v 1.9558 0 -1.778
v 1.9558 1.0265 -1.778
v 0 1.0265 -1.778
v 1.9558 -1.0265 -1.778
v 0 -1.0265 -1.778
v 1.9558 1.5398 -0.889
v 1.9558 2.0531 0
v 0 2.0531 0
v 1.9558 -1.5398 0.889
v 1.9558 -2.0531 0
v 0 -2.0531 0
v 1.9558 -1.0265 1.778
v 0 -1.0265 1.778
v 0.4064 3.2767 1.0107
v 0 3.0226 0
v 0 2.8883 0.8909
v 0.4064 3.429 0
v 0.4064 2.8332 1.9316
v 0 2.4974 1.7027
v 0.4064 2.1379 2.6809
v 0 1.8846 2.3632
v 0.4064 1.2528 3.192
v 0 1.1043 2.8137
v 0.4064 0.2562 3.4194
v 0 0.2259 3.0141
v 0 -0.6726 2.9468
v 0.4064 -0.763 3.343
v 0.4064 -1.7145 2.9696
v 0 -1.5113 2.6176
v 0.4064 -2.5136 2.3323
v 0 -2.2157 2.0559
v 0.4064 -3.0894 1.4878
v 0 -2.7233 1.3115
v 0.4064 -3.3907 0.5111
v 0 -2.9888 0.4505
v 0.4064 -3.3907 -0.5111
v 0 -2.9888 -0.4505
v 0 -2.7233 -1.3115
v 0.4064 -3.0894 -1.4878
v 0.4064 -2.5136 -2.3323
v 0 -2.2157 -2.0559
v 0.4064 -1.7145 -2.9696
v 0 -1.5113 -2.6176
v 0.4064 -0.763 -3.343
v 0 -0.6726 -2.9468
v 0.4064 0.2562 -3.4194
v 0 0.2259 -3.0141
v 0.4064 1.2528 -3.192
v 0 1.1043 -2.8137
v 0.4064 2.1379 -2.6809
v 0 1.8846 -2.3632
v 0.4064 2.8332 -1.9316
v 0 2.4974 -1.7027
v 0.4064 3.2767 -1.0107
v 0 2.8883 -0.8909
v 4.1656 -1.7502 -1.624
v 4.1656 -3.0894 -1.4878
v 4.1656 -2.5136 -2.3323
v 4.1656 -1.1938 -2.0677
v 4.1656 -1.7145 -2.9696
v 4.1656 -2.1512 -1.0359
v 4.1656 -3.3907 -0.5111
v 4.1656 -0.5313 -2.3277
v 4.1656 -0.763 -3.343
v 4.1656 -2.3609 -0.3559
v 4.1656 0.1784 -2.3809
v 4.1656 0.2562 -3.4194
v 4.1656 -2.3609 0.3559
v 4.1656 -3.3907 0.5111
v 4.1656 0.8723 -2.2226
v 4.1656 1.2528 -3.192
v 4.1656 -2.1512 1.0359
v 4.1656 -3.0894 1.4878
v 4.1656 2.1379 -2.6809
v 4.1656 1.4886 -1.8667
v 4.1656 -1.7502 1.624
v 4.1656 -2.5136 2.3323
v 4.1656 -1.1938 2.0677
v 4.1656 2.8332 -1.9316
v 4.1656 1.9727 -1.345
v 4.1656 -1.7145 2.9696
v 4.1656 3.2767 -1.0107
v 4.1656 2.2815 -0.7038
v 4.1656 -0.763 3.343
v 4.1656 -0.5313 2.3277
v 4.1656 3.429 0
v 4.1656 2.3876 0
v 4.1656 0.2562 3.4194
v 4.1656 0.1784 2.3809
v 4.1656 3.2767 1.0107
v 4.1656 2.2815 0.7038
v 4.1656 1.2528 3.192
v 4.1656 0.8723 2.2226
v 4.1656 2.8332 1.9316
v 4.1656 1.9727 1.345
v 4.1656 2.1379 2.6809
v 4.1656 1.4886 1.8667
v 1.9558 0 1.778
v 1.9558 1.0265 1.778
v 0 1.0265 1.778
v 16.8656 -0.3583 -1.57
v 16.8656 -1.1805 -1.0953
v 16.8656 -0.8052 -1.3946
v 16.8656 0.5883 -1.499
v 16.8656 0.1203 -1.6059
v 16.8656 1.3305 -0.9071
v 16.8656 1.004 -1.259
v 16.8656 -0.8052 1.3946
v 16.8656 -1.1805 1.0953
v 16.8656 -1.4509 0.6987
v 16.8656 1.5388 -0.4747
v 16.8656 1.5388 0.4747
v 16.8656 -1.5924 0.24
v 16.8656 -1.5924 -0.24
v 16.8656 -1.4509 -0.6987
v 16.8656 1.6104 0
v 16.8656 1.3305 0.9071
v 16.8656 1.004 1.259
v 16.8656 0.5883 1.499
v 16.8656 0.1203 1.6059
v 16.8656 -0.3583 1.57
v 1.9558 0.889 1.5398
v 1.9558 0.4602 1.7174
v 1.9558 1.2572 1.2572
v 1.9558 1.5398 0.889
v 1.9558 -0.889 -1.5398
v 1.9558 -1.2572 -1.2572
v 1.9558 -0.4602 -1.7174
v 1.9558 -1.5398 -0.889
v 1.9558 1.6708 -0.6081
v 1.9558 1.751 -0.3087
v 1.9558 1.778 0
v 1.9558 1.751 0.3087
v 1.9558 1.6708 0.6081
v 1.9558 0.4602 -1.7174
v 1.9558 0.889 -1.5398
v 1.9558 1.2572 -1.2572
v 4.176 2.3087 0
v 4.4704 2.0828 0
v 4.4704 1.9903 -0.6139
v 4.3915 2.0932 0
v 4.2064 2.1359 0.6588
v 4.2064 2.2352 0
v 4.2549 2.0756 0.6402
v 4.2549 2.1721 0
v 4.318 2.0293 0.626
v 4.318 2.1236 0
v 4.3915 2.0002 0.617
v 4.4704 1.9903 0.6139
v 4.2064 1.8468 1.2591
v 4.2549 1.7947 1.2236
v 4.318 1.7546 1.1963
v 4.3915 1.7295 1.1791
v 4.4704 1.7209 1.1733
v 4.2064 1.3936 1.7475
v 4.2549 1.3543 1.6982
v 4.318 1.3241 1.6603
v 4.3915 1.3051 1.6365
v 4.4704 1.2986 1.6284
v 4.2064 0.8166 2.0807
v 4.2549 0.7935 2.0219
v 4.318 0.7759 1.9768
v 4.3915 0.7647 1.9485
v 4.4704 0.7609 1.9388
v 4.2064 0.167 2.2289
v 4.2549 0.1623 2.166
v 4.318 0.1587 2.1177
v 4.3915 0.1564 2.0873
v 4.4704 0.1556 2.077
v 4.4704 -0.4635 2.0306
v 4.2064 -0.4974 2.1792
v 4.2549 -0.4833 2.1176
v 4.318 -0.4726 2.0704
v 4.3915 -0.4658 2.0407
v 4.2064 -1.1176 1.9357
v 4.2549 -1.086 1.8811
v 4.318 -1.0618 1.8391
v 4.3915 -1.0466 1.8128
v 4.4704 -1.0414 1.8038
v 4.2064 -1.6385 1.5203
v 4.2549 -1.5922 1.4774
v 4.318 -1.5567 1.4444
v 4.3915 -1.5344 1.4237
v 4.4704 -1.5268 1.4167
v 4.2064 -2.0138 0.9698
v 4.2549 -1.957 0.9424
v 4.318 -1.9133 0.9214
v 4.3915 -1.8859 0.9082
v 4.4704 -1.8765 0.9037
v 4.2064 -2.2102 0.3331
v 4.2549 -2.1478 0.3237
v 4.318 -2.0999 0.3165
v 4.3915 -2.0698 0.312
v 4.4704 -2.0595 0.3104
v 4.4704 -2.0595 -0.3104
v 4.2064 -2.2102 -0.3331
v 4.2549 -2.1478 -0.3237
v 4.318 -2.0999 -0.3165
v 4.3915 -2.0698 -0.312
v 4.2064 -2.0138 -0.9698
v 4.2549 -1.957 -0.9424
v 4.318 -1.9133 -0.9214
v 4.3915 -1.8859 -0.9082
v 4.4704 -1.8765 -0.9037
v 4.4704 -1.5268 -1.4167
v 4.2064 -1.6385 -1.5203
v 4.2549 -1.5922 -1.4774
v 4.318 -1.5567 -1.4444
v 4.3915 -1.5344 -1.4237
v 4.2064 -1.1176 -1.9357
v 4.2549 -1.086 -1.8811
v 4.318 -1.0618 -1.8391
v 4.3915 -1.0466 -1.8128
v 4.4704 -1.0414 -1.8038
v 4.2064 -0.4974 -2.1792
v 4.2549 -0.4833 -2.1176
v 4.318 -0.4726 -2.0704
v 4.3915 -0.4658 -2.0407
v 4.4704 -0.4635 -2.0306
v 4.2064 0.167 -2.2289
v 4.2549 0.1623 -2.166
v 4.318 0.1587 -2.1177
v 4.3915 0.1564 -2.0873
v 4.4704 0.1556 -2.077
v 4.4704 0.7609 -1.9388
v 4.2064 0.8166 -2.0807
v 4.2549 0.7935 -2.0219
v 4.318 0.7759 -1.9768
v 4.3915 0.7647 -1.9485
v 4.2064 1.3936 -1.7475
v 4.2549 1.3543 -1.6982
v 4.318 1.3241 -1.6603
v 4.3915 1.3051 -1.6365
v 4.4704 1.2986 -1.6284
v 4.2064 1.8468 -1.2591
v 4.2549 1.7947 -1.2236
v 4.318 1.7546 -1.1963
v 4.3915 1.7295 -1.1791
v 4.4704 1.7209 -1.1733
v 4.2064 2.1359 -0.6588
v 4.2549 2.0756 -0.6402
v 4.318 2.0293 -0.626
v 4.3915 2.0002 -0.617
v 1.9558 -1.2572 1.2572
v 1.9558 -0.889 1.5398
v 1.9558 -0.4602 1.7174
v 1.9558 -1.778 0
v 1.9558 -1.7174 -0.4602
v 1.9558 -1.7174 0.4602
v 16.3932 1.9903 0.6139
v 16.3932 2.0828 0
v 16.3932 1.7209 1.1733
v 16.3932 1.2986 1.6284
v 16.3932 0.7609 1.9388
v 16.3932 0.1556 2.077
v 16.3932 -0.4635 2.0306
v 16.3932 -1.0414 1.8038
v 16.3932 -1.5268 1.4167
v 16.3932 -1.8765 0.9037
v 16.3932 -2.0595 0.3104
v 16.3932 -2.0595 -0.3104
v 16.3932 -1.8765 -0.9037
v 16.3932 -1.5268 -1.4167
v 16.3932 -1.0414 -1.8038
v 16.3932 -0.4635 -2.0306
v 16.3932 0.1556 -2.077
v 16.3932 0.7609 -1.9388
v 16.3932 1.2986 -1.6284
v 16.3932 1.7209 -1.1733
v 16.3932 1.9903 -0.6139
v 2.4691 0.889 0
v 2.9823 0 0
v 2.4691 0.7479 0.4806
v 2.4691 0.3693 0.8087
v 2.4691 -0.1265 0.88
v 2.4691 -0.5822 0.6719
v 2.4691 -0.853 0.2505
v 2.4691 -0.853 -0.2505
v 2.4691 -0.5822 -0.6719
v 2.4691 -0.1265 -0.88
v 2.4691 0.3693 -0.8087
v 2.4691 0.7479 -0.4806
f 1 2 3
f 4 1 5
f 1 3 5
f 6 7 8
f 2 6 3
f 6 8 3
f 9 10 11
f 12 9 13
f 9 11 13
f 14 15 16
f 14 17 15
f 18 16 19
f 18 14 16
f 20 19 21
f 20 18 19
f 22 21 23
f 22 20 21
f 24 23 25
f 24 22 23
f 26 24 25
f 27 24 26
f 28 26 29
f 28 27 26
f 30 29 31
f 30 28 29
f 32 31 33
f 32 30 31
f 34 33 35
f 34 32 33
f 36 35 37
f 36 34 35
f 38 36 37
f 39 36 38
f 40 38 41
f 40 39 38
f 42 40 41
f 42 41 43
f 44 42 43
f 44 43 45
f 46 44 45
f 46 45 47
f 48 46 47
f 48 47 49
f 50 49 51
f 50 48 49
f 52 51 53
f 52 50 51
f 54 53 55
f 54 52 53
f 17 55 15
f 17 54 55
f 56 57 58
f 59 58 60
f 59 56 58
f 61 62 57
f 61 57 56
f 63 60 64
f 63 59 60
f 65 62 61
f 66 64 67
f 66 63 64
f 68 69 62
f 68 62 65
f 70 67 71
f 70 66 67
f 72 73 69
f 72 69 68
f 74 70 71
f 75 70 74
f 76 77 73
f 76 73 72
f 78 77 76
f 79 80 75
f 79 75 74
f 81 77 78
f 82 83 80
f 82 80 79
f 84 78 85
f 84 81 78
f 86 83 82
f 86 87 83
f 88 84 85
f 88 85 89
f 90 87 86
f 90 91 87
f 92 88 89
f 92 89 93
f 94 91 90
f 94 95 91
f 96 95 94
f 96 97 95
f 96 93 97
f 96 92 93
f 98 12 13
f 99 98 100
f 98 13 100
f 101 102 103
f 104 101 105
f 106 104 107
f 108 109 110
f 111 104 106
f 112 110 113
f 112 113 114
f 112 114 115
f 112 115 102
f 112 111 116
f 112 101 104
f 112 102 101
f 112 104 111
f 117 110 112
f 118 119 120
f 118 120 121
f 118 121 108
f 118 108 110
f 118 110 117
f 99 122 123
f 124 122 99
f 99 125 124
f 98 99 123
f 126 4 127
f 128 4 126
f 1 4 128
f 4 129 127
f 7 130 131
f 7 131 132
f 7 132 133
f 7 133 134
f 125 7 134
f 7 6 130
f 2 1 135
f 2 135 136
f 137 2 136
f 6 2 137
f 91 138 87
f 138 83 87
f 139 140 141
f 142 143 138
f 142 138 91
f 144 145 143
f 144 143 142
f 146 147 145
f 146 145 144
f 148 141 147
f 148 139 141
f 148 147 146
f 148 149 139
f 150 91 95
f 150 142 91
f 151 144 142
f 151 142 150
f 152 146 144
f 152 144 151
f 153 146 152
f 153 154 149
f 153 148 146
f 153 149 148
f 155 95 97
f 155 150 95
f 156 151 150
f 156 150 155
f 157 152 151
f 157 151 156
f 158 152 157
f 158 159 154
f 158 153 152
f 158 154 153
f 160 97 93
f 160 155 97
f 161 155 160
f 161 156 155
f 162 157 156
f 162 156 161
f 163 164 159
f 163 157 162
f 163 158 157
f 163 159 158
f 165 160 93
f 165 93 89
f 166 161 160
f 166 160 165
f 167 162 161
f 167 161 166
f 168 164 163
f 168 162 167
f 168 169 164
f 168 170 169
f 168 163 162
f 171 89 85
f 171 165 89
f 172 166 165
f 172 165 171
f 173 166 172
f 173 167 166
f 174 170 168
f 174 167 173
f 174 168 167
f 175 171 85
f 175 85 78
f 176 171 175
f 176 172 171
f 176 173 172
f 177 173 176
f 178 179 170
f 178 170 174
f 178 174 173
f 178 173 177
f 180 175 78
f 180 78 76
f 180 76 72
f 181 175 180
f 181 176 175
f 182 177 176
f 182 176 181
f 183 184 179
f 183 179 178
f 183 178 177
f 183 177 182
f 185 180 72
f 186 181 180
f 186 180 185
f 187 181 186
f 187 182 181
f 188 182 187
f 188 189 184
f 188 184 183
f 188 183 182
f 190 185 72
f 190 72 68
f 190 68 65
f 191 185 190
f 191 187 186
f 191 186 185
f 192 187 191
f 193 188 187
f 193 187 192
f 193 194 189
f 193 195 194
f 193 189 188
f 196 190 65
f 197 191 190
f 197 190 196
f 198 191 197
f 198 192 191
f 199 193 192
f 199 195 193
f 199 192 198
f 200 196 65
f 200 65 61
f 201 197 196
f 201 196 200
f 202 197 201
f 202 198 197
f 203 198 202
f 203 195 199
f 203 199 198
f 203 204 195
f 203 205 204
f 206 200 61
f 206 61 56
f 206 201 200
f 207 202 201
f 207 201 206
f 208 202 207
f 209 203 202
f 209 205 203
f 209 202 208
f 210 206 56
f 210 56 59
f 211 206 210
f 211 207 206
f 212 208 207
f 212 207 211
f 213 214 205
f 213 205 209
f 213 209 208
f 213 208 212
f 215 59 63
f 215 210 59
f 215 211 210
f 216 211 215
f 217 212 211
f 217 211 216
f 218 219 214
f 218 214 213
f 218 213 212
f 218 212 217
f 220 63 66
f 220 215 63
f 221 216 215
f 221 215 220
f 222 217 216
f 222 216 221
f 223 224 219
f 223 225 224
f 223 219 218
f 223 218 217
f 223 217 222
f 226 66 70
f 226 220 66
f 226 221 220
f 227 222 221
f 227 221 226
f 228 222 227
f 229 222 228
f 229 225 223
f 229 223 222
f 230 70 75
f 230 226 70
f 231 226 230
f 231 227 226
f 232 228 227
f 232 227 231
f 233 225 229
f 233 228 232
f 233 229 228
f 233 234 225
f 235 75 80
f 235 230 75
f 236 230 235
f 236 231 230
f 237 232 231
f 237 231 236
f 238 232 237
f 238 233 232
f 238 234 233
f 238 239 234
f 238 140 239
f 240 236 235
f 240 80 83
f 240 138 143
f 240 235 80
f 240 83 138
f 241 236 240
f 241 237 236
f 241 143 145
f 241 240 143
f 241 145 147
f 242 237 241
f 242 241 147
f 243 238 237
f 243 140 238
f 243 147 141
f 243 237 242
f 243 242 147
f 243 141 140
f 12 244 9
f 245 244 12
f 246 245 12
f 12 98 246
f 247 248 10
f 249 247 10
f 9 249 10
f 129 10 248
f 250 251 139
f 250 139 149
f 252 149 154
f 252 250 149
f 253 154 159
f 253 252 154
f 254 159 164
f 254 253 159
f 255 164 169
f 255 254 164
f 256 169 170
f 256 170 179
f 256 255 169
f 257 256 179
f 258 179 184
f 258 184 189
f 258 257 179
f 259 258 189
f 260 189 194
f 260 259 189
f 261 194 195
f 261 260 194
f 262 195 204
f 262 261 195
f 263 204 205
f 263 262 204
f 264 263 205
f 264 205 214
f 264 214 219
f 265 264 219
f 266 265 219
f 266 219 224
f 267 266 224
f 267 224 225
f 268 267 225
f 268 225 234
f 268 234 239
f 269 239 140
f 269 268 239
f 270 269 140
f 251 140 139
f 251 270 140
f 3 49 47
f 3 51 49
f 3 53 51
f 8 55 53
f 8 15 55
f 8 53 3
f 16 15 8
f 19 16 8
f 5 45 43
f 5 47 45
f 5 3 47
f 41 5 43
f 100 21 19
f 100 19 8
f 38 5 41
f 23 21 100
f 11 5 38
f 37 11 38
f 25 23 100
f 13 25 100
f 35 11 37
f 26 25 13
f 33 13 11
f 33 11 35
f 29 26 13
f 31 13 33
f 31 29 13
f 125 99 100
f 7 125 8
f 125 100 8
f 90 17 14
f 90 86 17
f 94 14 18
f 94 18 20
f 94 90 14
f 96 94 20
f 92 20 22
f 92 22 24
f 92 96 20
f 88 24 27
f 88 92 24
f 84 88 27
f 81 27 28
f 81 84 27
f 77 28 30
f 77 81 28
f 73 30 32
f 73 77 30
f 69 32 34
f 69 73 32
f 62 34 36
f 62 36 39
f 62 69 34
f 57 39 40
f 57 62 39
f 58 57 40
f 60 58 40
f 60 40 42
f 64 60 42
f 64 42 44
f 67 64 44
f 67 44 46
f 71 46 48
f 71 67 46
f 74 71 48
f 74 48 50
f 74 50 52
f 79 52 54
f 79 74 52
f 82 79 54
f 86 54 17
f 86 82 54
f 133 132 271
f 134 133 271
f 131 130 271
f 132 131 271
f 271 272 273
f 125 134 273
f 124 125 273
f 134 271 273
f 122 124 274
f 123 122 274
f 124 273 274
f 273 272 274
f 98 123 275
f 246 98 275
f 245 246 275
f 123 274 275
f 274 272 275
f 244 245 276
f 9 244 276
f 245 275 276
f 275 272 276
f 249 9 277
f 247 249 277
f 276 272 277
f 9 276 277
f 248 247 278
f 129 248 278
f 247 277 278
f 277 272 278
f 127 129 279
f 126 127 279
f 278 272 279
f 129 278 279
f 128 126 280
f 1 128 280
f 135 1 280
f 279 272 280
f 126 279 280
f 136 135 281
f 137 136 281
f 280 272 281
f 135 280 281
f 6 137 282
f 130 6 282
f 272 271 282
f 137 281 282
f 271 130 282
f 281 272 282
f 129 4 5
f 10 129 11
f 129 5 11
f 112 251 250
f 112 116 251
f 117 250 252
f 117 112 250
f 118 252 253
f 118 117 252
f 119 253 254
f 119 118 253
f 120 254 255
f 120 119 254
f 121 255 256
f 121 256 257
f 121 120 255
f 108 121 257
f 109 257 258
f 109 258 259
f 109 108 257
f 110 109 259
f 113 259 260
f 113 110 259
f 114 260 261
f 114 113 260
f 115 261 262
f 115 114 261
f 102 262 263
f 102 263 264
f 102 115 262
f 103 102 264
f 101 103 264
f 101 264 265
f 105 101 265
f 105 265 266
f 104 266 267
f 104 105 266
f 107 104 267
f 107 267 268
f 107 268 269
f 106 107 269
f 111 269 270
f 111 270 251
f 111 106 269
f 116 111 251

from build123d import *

# Parameters (mm, degrees)
FILLET1_R   = 0.3048
HEX_2_DEPTH = 1.9558


with BuildPart() as part:
    # BodySke → Base-Revolve (revolve)
    with BuildSketch(Plane.XY):
        Polygon((0, 0), (0, 3.0226), (0.4064, 3.429), (4.1656, 3.429), (4.1656, 2.0828), (16.39316, 2.0828), (16.8656, 1.61036), (16.8656, 0), align=None)
    revolve(axis=Axis((-31.75, 0, 0), (1, 0, 0)))

    # Fillet1
    fillet1_edges = [part.edges().sort_by_distance(p)[0] for p in [
        (4.1656, -2.0828, 0),
    ]]
    fillet(fillet1_edges, radius=FILLET1_R)

    # Sketch2 → Hex-PreBroach (revolve, cut)
    with BuildSketch(Plane.XY):
        Polygon((0, 1.778), (1.9558, 1.778), (2.982328779, 0), (0, 0), align=None)
    revolve(axis=Axis((0, 0, 0), (1, 0, 0)), mode=Mode.SUBTRACT)

    # Sketch3 → Hex 2 (cut)
    with BuildSketch(Plane(origin=(0, 0, 0), x_dir=(0, 0.5, 0.866025404), z_dir=(-1, 0, 0))):
        Polygon((1.026528779, 1.778), (-1.026528779, 1.778), (-2.053057557, 0), (-1.026528779, -1.778), (1.026528779, -1.778), (2.053057557, 0), align=None)
    extrude(amount=-HEX_2_DEPTH, mode=Mode.SUBTRACT)


solid = part.part
